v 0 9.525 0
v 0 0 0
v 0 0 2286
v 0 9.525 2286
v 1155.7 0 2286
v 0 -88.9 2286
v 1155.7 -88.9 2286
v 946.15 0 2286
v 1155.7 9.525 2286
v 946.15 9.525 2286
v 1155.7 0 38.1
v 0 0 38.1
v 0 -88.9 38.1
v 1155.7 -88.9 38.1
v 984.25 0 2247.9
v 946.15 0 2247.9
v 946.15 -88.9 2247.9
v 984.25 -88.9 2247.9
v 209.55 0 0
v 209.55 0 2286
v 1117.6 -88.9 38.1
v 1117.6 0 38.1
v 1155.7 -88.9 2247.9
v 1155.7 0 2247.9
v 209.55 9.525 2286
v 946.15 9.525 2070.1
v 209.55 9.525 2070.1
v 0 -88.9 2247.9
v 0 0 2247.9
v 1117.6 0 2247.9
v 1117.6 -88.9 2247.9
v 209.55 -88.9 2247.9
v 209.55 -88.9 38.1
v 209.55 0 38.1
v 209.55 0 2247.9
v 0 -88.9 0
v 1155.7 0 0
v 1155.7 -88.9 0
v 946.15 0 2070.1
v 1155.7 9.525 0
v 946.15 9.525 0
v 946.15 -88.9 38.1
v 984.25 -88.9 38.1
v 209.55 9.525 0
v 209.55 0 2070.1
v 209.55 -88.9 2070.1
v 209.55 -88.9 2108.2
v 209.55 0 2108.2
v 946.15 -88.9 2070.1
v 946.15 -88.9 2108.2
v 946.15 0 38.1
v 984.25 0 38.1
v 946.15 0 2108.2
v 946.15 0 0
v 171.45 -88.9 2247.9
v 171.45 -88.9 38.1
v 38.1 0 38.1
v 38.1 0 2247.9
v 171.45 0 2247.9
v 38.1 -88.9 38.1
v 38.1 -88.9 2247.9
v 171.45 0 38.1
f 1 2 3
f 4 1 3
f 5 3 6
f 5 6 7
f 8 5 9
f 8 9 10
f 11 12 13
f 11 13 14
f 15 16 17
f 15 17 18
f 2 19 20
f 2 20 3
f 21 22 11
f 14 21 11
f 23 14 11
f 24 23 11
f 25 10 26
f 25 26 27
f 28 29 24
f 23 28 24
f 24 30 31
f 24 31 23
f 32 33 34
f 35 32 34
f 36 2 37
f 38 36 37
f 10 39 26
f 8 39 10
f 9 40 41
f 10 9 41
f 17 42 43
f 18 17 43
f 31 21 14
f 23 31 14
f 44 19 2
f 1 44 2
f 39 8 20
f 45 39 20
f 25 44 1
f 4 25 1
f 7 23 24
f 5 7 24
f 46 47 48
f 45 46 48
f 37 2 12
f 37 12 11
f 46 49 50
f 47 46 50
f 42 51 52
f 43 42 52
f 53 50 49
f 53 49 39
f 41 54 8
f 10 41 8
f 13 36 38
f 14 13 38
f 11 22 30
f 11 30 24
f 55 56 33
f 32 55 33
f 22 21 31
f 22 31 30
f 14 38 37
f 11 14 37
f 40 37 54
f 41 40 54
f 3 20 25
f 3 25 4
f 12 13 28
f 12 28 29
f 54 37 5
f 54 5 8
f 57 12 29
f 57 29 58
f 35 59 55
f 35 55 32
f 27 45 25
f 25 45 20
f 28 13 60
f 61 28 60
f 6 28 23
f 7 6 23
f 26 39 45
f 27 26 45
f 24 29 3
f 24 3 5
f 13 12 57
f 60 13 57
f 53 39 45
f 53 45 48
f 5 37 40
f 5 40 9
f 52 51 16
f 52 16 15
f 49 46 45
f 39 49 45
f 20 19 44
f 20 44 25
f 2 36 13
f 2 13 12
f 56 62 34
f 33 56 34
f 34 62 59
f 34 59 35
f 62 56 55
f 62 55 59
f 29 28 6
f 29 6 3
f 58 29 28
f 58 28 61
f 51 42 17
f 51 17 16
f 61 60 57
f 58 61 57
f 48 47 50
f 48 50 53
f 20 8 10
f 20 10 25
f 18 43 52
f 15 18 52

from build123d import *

# Parameters (mm, degrees)
F0_W      = 1155.7
F0_H      = 88.9
F1_DEPTH  = 38.1
F2_W      = 38.1
F2_H      = 88.9
F3_DEPTH  = 2209.8
F4_W      = 1155.7
F4_H      = 88.9
F5_DEPTH  = 38.1
F6_W      = 88.9
F6_H      = 38.1
F7_DEPTH  = 736.6
F8_W      = 209.55
F8_H      = 2286
F9_DEPTH  = 9.525
F10_W     = 736.6
F10_H     = 215.9
F11_DEPTH = 9.525


with BuildPart() as f1:
    # F0 (on Top) → F1 (new body)
    with BuildSketch(Plane.XY):
        with Locations((577.85, -44.45)):
            Rectangle(F0_W, F0_H)
    extrude(amount=F1_DEPTH)


with BuildPart() as f3:
    # F2 (on face) → F3 (new body)
    with BuildSketch(Plane.XY.offset(38.1)):
        with Locations((19.05, -44.45)):
            Rectangle(F2_W, F2_H)
    extrude(amount=F3_DEPTH)


with BuildPart() as f3b:
    # F2 (on face) → F3, piece 2 (new body)
    with BuildSketch(Plane.XY.offset(38.1)):
        with Locations((1136.65, -44.45)):
            Rectangle(F2_W, F2_H)
    extrude(amount=F3_DEPTH)


with BuildPart() as f3c:
    # F2 (on face) → F3, piece 3 (new body)
    with BuildSketch(Plane.XY.offset(38.1)):
        with Locations((190.5, -44.45)):
            Rectangle(F2_W, F2_H)
    extrude(amount=F3_DEPTH)


with BuildPart() as f3d:
    # F2 (on face) → F3, piece 4 (new body)
    with BuildSketch(Plane.XY.offset(38.1)):
        with Locations((965.2, -44.45)):
            Rectangle(F2_W, F2_H)
    extrude(amount=F3_DEPTH)


with BuildPart() as f5:
    # F4 (on face) → F5 (new body)
    with BuildSketch(Plane.XY.offset(2247.9)):
        with Locations((577.85, -44.45)):
            Rectangle(F4_W, F4_H)
    extrude(amount=F5_DEPTH)


with BuildPart() as f7:
    # F6 (on face) → F7 (new body)
    with BuildSketch(Plane.YZ.offset(209.55)):
        with Locations((-44.45, 2089.15)):
            Rectangle(F6_W, F6_H)
    extrude(amount=F7_DEPTH)


with BuildPart() as f9:
    # F8 (on face) → F9 (new body)
    with BuildSketch(Plane(origin=(0, 0, 0), x_dir=(-1, 0, 0), z_dir=(0, 1, 0))):
        with Locations((-1050.925, 1143)):
            Rectangle(F8_W, F8_H)
    extrude(amount=F9_DEPTH)


with BuildPart() as f9b:
    # F8 (on face) → F9, piece 2 (new body)
    with BuildSketch(Plane(origin=(0, 0, 0), x_dir=(-1, 0, 0), z_dir=(0, 1, 0))):
        with Locations((-104.775, 1143)):
            Rectangle(F8_W, F8_H)
    extrude(amount=F9_DEPTH)


with BuildPart() as f11:
    # F10 (on face) → F11 (new body)
    with BuildSketch(Plane(origin=(0, 0, 0), x_dir=(-1, 0, 0), z_dir=(0, 1, 0))):
        with Locations((-577.85, 2178.05)):
            Rectangle(F10_W, F10_H)
    extrude(amount=F11_DEPTH)


solid = Compound([f1.part, f3.part, f3b.part, f3c.part, f3d.part, f5.part, f7.part, f9.part, f9b.part, f11.part])
